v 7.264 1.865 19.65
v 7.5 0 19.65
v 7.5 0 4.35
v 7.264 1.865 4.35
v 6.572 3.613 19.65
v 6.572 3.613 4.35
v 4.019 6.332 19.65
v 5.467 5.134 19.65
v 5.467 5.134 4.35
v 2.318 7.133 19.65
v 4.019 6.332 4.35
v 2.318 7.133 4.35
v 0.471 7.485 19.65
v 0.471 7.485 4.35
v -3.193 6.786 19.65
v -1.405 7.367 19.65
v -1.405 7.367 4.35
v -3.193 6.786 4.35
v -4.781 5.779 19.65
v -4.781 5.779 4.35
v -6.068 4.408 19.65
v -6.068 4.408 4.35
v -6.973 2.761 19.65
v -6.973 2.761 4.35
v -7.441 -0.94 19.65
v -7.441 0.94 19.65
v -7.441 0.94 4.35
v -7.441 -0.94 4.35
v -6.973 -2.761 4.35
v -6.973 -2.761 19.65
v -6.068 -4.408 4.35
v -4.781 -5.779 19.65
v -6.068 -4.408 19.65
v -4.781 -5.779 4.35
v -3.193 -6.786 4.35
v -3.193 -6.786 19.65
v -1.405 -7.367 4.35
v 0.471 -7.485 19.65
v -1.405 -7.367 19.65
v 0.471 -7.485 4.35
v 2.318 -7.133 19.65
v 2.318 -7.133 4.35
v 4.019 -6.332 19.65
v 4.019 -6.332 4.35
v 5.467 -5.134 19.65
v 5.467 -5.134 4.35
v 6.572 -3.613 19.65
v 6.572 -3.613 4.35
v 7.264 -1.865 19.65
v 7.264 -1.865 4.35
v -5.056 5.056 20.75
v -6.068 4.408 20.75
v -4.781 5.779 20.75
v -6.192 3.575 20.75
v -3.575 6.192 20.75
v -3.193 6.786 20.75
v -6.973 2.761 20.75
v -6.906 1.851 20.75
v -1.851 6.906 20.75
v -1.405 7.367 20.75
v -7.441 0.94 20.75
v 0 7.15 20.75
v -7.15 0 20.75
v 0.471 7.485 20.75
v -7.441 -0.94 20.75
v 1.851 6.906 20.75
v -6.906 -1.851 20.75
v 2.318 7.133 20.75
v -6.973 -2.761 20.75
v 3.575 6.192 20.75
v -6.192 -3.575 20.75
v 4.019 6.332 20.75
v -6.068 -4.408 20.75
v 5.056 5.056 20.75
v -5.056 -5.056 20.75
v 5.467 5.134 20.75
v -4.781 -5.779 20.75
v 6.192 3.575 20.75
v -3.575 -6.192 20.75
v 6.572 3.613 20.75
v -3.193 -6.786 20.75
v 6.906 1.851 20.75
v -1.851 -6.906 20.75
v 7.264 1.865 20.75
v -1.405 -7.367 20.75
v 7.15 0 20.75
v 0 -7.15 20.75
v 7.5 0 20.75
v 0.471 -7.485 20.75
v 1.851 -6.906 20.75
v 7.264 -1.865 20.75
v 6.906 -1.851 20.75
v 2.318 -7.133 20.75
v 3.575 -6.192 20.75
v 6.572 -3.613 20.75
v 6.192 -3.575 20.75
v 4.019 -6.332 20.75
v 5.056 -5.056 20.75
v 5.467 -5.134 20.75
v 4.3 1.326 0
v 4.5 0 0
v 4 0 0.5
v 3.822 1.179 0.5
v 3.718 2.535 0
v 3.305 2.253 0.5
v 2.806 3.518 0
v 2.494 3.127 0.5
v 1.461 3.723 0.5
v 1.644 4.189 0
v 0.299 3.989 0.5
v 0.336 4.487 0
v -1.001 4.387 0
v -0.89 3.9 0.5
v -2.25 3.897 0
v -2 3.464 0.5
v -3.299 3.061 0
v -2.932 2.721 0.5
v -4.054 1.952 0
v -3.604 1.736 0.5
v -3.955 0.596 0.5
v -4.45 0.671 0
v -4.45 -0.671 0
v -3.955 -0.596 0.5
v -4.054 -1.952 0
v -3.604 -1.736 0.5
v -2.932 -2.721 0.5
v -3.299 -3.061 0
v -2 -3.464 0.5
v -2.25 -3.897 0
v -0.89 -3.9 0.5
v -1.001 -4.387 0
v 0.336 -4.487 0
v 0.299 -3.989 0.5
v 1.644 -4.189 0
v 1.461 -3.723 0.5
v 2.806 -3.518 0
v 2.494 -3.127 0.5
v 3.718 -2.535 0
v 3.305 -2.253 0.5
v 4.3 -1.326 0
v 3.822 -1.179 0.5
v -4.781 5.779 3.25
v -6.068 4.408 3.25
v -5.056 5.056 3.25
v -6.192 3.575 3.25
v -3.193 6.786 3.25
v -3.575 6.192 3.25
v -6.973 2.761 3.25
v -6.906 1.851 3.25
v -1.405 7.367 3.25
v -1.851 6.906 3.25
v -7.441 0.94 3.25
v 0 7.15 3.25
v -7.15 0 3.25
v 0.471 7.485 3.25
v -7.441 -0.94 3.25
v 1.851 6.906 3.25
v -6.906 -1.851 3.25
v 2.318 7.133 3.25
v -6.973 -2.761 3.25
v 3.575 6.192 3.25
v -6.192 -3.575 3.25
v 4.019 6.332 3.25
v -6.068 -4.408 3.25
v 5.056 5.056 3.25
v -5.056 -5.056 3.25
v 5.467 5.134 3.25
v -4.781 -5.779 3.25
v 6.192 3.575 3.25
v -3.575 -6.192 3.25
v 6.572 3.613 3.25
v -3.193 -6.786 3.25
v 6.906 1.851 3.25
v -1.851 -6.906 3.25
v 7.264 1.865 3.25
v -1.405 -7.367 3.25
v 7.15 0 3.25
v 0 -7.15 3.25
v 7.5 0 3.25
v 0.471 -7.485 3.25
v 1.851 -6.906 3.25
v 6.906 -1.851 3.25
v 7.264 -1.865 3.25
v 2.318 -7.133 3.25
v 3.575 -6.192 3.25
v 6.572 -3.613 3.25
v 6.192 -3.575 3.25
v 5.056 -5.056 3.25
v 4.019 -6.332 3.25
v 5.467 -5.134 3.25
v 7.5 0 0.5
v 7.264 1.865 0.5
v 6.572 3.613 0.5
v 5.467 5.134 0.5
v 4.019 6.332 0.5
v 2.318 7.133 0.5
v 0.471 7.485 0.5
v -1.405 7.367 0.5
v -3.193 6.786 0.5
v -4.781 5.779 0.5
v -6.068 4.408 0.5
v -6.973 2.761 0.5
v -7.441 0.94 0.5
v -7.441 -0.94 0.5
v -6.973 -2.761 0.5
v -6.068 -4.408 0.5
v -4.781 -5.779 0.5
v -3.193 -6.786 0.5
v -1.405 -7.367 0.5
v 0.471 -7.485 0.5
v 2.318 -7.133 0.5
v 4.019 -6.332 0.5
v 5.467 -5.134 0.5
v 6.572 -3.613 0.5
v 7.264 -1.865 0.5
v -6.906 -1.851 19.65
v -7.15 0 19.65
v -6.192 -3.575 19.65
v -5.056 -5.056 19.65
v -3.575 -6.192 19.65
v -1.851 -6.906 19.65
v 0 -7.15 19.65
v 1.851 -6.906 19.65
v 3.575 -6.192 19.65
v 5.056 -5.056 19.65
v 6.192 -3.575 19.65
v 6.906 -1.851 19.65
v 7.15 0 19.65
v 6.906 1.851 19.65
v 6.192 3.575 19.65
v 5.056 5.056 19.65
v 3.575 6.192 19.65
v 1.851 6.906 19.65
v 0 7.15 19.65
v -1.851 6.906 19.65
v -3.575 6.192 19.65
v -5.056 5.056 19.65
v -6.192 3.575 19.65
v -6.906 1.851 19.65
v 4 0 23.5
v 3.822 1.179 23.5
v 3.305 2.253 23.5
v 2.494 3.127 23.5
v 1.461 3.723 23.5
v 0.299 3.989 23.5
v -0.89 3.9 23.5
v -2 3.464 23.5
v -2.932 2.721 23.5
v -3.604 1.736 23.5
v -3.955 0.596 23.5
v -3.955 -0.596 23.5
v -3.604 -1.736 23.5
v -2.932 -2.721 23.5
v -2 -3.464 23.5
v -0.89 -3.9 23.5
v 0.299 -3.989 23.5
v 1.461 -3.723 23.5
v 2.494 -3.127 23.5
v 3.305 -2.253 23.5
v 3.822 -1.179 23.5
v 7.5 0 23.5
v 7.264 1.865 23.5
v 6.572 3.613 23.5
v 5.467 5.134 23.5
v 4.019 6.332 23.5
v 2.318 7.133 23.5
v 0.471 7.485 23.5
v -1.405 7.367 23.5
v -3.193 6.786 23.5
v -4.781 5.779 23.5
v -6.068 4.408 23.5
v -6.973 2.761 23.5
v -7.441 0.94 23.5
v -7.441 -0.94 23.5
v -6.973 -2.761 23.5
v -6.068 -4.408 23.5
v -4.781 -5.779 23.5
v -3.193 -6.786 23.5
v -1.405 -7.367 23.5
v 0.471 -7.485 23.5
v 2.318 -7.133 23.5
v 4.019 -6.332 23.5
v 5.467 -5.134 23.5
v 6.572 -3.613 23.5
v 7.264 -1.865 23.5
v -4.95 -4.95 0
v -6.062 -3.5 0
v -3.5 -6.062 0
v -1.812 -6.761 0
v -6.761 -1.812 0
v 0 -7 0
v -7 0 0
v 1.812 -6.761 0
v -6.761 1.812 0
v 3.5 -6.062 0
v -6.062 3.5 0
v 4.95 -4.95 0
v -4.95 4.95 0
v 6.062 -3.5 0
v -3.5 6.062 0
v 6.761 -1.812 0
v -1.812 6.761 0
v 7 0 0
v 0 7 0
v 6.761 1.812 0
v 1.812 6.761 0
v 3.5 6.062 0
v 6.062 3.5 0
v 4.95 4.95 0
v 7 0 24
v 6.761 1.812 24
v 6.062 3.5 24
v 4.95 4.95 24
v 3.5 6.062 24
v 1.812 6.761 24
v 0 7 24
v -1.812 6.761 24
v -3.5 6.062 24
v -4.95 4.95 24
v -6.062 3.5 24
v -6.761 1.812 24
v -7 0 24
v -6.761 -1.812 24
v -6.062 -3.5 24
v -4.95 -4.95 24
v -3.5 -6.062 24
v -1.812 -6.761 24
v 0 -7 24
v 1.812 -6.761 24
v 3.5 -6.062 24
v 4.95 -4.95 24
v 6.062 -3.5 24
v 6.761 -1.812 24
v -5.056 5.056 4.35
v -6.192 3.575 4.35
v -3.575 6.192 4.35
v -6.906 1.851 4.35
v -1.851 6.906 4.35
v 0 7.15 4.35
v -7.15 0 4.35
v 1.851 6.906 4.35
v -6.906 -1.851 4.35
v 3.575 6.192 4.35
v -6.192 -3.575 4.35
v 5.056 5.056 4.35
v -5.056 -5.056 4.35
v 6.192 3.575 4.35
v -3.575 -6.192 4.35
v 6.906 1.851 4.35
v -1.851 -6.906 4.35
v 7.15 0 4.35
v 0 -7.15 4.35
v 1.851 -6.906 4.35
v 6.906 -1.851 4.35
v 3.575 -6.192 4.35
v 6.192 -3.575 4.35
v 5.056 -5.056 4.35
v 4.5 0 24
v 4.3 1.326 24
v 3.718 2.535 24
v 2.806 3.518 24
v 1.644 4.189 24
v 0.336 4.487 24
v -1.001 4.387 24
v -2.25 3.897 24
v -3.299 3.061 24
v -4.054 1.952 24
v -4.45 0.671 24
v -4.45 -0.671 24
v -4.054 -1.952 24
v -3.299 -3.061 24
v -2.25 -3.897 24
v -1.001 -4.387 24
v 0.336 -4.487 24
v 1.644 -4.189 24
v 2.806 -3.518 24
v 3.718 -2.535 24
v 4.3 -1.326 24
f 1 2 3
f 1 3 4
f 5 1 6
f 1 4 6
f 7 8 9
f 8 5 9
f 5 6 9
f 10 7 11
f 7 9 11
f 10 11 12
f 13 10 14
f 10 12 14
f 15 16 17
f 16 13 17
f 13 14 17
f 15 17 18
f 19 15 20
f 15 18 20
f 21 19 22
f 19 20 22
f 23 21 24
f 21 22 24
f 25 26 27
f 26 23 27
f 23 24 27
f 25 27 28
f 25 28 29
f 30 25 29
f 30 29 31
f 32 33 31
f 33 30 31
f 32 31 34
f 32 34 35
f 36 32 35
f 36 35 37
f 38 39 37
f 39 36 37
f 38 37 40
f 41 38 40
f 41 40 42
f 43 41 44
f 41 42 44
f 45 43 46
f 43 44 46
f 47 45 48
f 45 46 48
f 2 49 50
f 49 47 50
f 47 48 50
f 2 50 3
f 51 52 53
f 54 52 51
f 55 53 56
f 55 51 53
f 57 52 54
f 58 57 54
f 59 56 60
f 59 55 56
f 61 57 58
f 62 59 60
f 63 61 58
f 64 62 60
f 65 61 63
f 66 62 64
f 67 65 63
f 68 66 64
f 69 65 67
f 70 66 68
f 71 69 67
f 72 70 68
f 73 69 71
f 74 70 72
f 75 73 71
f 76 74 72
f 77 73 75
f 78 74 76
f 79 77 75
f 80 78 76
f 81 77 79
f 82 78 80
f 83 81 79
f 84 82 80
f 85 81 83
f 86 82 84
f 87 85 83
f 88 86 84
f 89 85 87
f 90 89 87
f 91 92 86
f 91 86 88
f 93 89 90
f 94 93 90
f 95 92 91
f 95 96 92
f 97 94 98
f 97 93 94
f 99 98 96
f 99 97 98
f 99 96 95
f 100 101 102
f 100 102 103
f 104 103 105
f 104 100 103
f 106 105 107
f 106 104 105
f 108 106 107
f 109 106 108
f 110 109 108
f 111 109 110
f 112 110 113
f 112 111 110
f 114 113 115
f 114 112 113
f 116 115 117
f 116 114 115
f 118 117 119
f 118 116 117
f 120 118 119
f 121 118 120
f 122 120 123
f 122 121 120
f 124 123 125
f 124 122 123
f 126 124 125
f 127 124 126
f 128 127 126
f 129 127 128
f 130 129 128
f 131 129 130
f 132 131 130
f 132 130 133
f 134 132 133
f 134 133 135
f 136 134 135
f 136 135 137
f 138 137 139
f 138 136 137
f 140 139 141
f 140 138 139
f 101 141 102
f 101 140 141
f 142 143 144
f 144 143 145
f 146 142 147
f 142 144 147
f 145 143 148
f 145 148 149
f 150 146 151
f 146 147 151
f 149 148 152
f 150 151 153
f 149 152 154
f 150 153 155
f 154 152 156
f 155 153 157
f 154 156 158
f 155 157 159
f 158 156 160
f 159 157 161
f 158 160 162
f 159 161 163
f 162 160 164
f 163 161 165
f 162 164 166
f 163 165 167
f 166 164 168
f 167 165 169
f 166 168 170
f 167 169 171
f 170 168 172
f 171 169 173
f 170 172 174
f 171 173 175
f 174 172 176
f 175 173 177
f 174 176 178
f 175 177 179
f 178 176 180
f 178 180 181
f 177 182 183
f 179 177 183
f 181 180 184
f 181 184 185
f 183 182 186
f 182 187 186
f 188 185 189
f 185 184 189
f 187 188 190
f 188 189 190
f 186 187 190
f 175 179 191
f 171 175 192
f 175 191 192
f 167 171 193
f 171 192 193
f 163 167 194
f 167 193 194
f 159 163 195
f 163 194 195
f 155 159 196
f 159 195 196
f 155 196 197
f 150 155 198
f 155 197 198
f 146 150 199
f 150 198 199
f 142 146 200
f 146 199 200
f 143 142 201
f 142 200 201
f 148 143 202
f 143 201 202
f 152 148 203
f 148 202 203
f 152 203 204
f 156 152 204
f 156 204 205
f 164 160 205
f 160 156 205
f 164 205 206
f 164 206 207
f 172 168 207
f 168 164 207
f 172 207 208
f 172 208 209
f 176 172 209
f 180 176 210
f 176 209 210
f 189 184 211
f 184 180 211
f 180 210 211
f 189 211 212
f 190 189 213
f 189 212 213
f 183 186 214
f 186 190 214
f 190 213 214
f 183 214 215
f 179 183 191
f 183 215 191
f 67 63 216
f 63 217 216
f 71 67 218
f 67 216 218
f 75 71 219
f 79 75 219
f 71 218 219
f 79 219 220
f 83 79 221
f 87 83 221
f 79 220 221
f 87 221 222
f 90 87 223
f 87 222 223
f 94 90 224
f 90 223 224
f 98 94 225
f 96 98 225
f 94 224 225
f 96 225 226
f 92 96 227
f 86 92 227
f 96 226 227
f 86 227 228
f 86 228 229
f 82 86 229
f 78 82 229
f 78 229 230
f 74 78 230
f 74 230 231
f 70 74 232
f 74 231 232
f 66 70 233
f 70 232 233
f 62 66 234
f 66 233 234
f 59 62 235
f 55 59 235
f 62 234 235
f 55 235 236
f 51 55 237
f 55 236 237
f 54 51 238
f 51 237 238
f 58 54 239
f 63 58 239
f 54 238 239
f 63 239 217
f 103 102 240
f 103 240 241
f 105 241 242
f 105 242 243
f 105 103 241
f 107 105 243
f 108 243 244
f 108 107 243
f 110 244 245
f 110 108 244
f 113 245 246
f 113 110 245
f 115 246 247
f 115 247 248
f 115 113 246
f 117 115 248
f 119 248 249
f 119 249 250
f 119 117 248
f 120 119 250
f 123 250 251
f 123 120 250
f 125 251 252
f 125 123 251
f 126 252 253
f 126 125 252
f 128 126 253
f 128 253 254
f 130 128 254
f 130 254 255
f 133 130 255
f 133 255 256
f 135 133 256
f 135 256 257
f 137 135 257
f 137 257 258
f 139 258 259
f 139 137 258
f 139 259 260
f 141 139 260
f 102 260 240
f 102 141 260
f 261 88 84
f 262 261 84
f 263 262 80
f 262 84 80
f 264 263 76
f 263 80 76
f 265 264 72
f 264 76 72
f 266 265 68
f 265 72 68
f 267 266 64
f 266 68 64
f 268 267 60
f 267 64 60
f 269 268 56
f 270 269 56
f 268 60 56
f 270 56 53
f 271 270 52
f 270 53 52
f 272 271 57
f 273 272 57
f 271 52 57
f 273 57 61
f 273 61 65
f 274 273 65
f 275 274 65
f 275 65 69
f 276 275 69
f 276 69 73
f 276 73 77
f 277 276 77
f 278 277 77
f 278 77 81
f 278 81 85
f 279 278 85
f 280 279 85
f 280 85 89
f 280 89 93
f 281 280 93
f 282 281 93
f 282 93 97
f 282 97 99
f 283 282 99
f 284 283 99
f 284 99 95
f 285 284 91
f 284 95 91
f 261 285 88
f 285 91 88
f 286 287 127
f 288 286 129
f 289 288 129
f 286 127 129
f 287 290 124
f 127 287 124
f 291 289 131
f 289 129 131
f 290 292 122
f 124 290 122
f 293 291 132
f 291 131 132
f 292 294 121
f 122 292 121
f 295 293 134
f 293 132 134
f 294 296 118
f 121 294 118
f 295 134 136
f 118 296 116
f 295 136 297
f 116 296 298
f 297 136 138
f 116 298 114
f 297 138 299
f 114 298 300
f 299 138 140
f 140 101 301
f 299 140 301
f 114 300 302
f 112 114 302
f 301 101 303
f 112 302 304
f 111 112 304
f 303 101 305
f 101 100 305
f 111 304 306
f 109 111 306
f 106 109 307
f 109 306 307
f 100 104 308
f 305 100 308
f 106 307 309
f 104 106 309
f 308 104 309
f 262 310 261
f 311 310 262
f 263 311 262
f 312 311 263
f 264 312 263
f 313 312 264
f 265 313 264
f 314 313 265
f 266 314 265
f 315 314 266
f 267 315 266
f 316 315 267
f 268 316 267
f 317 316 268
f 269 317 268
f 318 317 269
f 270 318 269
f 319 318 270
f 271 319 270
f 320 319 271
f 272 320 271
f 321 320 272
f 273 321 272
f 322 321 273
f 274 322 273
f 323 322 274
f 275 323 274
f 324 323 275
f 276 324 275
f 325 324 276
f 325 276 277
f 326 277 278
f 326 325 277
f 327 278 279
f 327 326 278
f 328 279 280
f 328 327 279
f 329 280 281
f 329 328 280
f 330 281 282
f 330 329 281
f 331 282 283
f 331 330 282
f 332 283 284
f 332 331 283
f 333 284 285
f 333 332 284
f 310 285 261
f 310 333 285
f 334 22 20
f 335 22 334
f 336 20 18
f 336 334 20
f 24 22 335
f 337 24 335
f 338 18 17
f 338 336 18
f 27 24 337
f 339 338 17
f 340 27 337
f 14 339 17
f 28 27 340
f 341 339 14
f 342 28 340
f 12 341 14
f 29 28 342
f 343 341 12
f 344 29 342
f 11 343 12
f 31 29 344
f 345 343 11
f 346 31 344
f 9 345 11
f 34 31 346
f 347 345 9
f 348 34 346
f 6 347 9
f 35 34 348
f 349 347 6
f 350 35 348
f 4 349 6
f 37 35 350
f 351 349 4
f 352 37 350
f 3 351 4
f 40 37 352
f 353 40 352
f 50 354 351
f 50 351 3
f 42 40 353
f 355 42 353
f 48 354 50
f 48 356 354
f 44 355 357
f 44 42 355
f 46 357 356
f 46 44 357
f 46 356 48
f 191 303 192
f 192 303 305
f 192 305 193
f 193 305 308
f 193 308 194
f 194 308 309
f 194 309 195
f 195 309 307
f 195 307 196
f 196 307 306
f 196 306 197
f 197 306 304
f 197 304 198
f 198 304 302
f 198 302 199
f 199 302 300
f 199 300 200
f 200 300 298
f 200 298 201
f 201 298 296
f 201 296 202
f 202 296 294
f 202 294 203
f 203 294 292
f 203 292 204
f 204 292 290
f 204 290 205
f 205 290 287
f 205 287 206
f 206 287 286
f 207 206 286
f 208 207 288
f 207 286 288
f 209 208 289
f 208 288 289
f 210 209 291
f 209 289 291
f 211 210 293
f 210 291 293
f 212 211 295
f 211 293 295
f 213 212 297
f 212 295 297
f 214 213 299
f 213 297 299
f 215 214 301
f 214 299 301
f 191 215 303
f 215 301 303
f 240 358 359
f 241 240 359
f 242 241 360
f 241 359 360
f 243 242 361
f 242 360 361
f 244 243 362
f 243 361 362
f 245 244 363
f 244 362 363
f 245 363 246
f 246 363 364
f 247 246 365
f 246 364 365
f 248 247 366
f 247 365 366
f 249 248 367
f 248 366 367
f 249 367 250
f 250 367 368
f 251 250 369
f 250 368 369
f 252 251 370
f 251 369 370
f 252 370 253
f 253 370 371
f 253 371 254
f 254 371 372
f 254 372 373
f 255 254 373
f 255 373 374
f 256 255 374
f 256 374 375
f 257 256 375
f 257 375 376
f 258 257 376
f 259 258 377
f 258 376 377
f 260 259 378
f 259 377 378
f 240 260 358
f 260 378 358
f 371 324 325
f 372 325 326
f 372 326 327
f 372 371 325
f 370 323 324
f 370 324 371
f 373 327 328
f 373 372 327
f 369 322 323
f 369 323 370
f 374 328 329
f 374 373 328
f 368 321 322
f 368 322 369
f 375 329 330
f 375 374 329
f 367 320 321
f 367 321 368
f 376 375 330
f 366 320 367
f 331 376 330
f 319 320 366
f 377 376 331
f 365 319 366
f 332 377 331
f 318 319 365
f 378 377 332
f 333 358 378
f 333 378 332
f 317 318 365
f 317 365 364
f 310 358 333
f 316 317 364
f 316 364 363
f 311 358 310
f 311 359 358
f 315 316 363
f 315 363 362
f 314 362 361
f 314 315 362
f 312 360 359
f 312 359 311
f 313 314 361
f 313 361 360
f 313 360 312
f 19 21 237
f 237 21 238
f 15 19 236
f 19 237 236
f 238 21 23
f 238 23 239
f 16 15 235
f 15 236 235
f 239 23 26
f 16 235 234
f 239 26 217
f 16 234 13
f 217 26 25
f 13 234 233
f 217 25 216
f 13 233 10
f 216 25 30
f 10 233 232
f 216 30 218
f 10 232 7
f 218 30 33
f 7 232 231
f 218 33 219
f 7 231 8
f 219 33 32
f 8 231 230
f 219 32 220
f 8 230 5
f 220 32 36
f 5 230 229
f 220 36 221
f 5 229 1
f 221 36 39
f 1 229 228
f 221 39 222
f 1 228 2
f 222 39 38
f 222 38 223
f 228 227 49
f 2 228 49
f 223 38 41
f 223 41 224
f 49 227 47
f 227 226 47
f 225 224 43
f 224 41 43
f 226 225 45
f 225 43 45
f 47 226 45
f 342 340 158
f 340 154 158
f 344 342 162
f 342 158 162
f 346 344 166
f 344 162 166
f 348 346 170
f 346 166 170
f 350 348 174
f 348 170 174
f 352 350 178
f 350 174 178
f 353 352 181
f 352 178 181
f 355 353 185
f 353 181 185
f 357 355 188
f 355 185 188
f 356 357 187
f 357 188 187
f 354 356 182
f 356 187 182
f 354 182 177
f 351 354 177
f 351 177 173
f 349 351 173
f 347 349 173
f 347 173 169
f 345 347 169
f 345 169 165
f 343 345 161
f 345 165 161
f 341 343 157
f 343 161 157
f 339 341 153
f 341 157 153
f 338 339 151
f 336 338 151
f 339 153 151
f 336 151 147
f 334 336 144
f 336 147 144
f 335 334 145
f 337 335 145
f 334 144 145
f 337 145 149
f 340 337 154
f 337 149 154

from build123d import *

# Parameters (mm, degrees)
SKETCH_1_R      = 7.5
SKETCH_1_R_2    = 4
EXTRUDE_1_DEPTH = 24
CHAMFER_1_SIZE  = 0.5
SKETCH_2_W      = 0.35
SKETCH_2_H      = 1.1


with BuildPart() as part:
    # 草图1 → 凸台-拉伸1 (new body)
    with BuildSketch(Plane.XY):
        Circle(SKETCH_1_R)
        Circle(SKETCH_1_R_2, mode=Mode.SUBTRACT)
    extrude(amount=EXTRUDE_1_DEPTH)

    # 倒角1
    chamfer_1_edges = [part.edges().sort_by_distance(p)[0] for p in [
        (-7.5, 0, 0),
        (-7.5, 0, 24),
        (-4, 0, 0),
        (-4, 0, 24),
    ]]
    chamfer(chamfer_1_edges, length=CHAMFER_1_SIZE)

    # 草图2 → 切除-旋转1 (revolve, cut)
    with BuildSketch(Plane(origin=(0, 0, 0), x_dir=(1, 0, 0), z_dir=(0, 1, 0)), mode=Mode.PRIVATE) as cut_revolve_1_sk:
        with Locations((7.325, -3.8)):
            Rectangle(SKETCH_2_W, SKETCH_2_H)
        with Locations((7.325, -20.2)):
            Rectangle(SKETCH_2_W, SKETCH_2_H)
    revolve(cut_revolve_1_sk.sketch.rotate(Axis((0, 0, 0), (0, 0, 1)), 180), axis=Axis((0, 0, 0), (0, 0, 1)), mode=Mode.SUBTRACT)


solid = part.part
